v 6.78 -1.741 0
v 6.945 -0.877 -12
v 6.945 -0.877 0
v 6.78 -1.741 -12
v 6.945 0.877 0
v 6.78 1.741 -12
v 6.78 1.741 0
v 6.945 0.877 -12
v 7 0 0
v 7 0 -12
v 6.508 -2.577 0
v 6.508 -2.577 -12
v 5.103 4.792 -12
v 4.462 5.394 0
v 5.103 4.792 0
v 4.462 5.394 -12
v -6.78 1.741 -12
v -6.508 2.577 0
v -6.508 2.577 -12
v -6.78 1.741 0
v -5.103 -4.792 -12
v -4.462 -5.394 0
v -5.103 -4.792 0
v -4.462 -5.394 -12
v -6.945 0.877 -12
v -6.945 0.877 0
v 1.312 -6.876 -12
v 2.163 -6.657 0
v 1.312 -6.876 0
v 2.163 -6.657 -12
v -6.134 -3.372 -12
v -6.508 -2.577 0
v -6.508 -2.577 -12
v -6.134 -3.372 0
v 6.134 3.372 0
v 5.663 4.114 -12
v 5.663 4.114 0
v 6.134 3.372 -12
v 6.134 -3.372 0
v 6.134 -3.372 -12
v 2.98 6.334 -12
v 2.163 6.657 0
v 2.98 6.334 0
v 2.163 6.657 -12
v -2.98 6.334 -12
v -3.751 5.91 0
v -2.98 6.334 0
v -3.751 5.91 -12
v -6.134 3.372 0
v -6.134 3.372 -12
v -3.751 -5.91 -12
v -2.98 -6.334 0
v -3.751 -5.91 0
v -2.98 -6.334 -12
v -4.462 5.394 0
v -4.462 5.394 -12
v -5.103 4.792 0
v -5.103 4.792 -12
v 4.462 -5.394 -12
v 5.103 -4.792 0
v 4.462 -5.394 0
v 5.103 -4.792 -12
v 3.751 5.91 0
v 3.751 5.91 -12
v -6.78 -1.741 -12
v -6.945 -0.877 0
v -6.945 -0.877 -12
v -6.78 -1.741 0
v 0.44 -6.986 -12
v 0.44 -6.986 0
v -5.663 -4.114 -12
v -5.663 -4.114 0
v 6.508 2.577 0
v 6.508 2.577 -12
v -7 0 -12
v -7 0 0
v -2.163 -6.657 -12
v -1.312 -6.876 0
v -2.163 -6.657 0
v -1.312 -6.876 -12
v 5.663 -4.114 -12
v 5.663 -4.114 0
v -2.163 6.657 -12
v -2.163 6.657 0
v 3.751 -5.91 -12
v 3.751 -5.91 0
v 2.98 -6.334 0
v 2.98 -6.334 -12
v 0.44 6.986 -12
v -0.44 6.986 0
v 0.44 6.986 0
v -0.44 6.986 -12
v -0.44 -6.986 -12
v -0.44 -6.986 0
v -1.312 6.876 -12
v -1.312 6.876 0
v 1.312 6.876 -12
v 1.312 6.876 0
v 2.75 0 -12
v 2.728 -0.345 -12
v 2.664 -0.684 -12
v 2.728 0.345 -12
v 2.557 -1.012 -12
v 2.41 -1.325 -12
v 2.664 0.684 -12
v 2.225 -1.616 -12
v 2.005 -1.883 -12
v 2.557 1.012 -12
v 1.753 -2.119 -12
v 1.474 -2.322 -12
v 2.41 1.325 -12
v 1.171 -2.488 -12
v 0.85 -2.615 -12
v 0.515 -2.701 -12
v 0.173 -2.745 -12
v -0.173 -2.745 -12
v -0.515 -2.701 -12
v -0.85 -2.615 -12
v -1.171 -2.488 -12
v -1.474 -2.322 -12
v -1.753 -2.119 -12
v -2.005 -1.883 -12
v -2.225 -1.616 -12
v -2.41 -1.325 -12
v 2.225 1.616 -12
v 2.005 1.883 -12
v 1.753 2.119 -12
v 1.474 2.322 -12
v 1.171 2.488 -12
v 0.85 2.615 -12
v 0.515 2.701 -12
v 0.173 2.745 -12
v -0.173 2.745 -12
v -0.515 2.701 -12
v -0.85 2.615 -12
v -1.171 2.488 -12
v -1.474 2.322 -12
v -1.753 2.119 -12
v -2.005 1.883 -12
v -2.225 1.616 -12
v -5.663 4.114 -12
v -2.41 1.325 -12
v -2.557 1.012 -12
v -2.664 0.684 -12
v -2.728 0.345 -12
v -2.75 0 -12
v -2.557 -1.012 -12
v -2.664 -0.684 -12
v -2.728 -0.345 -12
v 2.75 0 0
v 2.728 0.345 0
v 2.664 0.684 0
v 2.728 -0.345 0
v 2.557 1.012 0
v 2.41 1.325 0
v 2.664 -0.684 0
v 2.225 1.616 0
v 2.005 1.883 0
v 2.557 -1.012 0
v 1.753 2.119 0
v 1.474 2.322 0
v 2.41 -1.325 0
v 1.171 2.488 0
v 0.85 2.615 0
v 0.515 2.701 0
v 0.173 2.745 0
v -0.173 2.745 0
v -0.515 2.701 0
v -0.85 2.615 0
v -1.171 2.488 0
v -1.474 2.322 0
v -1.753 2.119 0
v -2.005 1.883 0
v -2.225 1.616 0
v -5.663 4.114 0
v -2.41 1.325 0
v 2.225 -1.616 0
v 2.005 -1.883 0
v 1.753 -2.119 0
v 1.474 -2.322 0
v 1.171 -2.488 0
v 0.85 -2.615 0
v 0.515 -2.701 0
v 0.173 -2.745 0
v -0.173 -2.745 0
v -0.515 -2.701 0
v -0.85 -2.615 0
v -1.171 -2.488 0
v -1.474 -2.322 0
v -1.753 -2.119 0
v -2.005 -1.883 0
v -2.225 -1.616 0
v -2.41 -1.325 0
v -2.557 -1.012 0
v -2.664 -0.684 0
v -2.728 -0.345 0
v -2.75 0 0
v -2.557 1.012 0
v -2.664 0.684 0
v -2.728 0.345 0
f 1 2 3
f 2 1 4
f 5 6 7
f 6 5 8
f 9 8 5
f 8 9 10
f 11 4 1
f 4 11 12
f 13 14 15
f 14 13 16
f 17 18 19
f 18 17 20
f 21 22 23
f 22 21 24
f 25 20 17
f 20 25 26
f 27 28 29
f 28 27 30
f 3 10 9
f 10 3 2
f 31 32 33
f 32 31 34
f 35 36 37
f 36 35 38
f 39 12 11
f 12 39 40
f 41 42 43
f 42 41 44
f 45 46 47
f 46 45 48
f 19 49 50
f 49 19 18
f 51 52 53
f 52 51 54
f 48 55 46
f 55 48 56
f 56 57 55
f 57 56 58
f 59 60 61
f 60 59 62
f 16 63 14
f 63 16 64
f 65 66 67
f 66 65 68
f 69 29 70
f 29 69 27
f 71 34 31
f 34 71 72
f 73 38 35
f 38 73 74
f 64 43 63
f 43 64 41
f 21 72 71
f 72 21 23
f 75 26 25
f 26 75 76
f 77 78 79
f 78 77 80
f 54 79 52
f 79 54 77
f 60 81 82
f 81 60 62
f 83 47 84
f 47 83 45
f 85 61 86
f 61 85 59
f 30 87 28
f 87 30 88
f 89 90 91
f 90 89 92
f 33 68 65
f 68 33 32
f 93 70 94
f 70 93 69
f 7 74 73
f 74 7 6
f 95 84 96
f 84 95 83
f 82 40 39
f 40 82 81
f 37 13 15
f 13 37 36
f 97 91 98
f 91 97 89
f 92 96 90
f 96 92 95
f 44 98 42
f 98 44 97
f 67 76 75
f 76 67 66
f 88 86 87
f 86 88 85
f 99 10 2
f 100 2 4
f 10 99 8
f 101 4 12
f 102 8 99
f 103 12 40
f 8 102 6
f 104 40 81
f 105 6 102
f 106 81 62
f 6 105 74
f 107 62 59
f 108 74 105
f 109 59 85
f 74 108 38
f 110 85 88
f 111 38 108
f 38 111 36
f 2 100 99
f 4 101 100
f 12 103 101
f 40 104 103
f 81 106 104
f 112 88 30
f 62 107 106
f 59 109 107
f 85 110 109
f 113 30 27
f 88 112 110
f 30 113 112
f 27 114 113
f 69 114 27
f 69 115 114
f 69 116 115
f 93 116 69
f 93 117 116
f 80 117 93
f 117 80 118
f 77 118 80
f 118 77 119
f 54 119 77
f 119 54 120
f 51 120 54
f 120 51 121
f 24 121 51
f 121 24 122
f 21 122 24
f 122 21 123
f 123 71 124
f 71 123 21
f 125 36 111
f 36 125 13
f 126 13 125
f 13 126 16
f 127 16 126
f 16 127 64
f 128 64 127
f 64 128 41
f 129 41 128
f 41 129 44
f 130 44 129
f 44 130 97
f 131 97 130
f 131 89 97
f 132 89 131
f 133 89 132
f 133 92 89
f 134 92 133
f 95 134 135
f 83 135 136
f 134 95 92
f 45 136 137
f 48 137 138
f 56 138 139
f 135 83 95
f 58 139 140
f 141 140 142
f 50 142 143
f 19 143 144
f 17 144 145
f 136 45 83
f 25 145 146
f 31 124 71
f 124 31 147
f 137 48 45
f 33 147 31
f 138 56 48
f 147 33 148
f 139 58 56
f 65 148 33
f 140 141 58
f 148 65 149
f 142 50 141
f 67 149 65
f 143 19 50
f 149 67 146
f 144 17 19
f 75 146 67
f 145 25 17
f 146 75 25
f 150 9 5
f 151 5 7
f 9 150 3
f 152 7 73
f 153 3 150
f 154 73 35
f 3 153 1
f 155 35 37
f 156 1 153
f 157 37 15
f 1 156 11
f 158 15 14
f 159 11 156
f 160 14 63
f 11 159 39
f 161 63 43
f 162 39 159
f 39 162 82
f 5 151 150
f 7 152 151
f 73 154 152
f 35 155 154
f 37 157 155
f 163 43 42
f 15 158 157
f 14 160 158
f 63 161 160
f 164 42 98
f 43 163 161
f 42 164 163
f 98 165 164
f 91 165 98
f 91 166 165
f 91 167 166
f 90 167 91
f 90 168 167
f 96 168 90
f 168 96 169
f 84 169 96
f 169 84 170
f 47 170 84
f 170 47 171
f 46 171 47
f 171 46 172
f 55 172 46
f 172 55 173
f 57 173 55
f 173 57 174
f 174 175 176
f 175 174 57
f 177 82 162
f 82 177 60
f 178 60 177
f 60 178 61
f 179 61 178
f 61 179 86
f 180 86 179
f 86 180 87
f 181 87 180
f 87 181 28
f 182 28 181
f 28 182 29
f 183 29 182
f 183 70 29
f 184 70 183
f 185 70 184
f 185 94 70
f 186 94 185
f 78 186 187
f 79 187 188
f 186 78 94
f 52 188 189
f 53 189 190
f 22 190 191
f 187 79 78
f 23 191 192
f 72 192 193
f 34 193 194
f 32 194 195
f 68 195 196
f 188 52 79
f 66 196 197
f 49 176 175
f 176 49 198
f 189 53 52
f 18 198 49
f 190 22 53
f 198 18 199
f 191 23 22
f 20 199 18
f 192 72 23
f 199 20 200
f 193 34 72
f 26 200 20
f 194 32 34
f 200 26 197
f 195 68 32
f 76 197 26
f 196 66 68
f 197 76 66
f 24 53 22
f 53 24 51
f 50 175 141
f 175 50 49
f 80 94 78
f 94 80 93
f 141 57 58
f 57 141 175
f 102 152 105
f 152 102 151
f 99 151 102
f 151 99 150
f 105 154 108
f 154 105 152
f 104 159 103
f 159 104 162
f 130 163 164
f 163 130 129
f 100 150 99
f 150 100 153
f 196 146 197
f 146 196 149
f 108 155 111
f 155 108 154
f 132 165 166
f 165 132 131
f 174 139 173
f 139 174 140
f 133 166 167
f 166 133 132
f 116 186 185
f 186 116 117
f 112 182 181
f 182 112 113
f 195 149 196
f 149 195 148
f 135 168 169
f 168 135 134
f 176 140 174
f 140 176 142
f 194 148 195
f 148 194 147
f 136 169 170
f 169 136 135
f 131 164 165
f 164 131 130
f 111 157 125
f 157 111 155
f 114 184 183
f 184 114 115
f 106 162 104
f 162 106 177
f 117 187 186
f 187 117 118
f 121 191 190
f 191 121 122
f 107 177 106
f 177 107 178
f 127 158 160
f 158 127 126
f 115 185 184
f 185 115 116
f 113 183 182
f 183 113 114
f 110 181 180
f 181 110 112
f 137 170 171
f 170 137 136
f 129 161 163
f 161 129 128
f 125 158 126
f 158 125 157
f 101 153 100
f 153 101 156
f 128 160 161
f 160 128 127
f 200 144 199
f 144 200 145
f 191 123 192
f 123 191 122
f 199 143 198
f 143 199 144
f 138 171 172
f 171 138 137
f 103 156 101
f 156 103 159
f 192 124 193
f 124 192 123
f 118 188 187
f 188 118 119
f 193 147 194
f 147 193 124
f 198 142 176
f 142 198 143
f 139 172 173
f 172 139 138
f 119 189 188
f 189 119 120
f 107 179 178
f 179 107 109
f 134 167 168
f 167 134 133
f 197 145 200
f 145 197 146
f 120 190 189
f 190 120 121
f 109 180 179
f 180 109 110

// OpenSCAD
$fn = 50;


difference() {
	union() {
		translate(v = [0, 0, -12.0000000000]) {
			cylinder(h = 12, r = 7.0000000000);
		}
	}
	union() {
		#translate(v = [0, 0, -12]) {
			cylinder(h = 12, r = 2.7500000000);
		}
	}
}
